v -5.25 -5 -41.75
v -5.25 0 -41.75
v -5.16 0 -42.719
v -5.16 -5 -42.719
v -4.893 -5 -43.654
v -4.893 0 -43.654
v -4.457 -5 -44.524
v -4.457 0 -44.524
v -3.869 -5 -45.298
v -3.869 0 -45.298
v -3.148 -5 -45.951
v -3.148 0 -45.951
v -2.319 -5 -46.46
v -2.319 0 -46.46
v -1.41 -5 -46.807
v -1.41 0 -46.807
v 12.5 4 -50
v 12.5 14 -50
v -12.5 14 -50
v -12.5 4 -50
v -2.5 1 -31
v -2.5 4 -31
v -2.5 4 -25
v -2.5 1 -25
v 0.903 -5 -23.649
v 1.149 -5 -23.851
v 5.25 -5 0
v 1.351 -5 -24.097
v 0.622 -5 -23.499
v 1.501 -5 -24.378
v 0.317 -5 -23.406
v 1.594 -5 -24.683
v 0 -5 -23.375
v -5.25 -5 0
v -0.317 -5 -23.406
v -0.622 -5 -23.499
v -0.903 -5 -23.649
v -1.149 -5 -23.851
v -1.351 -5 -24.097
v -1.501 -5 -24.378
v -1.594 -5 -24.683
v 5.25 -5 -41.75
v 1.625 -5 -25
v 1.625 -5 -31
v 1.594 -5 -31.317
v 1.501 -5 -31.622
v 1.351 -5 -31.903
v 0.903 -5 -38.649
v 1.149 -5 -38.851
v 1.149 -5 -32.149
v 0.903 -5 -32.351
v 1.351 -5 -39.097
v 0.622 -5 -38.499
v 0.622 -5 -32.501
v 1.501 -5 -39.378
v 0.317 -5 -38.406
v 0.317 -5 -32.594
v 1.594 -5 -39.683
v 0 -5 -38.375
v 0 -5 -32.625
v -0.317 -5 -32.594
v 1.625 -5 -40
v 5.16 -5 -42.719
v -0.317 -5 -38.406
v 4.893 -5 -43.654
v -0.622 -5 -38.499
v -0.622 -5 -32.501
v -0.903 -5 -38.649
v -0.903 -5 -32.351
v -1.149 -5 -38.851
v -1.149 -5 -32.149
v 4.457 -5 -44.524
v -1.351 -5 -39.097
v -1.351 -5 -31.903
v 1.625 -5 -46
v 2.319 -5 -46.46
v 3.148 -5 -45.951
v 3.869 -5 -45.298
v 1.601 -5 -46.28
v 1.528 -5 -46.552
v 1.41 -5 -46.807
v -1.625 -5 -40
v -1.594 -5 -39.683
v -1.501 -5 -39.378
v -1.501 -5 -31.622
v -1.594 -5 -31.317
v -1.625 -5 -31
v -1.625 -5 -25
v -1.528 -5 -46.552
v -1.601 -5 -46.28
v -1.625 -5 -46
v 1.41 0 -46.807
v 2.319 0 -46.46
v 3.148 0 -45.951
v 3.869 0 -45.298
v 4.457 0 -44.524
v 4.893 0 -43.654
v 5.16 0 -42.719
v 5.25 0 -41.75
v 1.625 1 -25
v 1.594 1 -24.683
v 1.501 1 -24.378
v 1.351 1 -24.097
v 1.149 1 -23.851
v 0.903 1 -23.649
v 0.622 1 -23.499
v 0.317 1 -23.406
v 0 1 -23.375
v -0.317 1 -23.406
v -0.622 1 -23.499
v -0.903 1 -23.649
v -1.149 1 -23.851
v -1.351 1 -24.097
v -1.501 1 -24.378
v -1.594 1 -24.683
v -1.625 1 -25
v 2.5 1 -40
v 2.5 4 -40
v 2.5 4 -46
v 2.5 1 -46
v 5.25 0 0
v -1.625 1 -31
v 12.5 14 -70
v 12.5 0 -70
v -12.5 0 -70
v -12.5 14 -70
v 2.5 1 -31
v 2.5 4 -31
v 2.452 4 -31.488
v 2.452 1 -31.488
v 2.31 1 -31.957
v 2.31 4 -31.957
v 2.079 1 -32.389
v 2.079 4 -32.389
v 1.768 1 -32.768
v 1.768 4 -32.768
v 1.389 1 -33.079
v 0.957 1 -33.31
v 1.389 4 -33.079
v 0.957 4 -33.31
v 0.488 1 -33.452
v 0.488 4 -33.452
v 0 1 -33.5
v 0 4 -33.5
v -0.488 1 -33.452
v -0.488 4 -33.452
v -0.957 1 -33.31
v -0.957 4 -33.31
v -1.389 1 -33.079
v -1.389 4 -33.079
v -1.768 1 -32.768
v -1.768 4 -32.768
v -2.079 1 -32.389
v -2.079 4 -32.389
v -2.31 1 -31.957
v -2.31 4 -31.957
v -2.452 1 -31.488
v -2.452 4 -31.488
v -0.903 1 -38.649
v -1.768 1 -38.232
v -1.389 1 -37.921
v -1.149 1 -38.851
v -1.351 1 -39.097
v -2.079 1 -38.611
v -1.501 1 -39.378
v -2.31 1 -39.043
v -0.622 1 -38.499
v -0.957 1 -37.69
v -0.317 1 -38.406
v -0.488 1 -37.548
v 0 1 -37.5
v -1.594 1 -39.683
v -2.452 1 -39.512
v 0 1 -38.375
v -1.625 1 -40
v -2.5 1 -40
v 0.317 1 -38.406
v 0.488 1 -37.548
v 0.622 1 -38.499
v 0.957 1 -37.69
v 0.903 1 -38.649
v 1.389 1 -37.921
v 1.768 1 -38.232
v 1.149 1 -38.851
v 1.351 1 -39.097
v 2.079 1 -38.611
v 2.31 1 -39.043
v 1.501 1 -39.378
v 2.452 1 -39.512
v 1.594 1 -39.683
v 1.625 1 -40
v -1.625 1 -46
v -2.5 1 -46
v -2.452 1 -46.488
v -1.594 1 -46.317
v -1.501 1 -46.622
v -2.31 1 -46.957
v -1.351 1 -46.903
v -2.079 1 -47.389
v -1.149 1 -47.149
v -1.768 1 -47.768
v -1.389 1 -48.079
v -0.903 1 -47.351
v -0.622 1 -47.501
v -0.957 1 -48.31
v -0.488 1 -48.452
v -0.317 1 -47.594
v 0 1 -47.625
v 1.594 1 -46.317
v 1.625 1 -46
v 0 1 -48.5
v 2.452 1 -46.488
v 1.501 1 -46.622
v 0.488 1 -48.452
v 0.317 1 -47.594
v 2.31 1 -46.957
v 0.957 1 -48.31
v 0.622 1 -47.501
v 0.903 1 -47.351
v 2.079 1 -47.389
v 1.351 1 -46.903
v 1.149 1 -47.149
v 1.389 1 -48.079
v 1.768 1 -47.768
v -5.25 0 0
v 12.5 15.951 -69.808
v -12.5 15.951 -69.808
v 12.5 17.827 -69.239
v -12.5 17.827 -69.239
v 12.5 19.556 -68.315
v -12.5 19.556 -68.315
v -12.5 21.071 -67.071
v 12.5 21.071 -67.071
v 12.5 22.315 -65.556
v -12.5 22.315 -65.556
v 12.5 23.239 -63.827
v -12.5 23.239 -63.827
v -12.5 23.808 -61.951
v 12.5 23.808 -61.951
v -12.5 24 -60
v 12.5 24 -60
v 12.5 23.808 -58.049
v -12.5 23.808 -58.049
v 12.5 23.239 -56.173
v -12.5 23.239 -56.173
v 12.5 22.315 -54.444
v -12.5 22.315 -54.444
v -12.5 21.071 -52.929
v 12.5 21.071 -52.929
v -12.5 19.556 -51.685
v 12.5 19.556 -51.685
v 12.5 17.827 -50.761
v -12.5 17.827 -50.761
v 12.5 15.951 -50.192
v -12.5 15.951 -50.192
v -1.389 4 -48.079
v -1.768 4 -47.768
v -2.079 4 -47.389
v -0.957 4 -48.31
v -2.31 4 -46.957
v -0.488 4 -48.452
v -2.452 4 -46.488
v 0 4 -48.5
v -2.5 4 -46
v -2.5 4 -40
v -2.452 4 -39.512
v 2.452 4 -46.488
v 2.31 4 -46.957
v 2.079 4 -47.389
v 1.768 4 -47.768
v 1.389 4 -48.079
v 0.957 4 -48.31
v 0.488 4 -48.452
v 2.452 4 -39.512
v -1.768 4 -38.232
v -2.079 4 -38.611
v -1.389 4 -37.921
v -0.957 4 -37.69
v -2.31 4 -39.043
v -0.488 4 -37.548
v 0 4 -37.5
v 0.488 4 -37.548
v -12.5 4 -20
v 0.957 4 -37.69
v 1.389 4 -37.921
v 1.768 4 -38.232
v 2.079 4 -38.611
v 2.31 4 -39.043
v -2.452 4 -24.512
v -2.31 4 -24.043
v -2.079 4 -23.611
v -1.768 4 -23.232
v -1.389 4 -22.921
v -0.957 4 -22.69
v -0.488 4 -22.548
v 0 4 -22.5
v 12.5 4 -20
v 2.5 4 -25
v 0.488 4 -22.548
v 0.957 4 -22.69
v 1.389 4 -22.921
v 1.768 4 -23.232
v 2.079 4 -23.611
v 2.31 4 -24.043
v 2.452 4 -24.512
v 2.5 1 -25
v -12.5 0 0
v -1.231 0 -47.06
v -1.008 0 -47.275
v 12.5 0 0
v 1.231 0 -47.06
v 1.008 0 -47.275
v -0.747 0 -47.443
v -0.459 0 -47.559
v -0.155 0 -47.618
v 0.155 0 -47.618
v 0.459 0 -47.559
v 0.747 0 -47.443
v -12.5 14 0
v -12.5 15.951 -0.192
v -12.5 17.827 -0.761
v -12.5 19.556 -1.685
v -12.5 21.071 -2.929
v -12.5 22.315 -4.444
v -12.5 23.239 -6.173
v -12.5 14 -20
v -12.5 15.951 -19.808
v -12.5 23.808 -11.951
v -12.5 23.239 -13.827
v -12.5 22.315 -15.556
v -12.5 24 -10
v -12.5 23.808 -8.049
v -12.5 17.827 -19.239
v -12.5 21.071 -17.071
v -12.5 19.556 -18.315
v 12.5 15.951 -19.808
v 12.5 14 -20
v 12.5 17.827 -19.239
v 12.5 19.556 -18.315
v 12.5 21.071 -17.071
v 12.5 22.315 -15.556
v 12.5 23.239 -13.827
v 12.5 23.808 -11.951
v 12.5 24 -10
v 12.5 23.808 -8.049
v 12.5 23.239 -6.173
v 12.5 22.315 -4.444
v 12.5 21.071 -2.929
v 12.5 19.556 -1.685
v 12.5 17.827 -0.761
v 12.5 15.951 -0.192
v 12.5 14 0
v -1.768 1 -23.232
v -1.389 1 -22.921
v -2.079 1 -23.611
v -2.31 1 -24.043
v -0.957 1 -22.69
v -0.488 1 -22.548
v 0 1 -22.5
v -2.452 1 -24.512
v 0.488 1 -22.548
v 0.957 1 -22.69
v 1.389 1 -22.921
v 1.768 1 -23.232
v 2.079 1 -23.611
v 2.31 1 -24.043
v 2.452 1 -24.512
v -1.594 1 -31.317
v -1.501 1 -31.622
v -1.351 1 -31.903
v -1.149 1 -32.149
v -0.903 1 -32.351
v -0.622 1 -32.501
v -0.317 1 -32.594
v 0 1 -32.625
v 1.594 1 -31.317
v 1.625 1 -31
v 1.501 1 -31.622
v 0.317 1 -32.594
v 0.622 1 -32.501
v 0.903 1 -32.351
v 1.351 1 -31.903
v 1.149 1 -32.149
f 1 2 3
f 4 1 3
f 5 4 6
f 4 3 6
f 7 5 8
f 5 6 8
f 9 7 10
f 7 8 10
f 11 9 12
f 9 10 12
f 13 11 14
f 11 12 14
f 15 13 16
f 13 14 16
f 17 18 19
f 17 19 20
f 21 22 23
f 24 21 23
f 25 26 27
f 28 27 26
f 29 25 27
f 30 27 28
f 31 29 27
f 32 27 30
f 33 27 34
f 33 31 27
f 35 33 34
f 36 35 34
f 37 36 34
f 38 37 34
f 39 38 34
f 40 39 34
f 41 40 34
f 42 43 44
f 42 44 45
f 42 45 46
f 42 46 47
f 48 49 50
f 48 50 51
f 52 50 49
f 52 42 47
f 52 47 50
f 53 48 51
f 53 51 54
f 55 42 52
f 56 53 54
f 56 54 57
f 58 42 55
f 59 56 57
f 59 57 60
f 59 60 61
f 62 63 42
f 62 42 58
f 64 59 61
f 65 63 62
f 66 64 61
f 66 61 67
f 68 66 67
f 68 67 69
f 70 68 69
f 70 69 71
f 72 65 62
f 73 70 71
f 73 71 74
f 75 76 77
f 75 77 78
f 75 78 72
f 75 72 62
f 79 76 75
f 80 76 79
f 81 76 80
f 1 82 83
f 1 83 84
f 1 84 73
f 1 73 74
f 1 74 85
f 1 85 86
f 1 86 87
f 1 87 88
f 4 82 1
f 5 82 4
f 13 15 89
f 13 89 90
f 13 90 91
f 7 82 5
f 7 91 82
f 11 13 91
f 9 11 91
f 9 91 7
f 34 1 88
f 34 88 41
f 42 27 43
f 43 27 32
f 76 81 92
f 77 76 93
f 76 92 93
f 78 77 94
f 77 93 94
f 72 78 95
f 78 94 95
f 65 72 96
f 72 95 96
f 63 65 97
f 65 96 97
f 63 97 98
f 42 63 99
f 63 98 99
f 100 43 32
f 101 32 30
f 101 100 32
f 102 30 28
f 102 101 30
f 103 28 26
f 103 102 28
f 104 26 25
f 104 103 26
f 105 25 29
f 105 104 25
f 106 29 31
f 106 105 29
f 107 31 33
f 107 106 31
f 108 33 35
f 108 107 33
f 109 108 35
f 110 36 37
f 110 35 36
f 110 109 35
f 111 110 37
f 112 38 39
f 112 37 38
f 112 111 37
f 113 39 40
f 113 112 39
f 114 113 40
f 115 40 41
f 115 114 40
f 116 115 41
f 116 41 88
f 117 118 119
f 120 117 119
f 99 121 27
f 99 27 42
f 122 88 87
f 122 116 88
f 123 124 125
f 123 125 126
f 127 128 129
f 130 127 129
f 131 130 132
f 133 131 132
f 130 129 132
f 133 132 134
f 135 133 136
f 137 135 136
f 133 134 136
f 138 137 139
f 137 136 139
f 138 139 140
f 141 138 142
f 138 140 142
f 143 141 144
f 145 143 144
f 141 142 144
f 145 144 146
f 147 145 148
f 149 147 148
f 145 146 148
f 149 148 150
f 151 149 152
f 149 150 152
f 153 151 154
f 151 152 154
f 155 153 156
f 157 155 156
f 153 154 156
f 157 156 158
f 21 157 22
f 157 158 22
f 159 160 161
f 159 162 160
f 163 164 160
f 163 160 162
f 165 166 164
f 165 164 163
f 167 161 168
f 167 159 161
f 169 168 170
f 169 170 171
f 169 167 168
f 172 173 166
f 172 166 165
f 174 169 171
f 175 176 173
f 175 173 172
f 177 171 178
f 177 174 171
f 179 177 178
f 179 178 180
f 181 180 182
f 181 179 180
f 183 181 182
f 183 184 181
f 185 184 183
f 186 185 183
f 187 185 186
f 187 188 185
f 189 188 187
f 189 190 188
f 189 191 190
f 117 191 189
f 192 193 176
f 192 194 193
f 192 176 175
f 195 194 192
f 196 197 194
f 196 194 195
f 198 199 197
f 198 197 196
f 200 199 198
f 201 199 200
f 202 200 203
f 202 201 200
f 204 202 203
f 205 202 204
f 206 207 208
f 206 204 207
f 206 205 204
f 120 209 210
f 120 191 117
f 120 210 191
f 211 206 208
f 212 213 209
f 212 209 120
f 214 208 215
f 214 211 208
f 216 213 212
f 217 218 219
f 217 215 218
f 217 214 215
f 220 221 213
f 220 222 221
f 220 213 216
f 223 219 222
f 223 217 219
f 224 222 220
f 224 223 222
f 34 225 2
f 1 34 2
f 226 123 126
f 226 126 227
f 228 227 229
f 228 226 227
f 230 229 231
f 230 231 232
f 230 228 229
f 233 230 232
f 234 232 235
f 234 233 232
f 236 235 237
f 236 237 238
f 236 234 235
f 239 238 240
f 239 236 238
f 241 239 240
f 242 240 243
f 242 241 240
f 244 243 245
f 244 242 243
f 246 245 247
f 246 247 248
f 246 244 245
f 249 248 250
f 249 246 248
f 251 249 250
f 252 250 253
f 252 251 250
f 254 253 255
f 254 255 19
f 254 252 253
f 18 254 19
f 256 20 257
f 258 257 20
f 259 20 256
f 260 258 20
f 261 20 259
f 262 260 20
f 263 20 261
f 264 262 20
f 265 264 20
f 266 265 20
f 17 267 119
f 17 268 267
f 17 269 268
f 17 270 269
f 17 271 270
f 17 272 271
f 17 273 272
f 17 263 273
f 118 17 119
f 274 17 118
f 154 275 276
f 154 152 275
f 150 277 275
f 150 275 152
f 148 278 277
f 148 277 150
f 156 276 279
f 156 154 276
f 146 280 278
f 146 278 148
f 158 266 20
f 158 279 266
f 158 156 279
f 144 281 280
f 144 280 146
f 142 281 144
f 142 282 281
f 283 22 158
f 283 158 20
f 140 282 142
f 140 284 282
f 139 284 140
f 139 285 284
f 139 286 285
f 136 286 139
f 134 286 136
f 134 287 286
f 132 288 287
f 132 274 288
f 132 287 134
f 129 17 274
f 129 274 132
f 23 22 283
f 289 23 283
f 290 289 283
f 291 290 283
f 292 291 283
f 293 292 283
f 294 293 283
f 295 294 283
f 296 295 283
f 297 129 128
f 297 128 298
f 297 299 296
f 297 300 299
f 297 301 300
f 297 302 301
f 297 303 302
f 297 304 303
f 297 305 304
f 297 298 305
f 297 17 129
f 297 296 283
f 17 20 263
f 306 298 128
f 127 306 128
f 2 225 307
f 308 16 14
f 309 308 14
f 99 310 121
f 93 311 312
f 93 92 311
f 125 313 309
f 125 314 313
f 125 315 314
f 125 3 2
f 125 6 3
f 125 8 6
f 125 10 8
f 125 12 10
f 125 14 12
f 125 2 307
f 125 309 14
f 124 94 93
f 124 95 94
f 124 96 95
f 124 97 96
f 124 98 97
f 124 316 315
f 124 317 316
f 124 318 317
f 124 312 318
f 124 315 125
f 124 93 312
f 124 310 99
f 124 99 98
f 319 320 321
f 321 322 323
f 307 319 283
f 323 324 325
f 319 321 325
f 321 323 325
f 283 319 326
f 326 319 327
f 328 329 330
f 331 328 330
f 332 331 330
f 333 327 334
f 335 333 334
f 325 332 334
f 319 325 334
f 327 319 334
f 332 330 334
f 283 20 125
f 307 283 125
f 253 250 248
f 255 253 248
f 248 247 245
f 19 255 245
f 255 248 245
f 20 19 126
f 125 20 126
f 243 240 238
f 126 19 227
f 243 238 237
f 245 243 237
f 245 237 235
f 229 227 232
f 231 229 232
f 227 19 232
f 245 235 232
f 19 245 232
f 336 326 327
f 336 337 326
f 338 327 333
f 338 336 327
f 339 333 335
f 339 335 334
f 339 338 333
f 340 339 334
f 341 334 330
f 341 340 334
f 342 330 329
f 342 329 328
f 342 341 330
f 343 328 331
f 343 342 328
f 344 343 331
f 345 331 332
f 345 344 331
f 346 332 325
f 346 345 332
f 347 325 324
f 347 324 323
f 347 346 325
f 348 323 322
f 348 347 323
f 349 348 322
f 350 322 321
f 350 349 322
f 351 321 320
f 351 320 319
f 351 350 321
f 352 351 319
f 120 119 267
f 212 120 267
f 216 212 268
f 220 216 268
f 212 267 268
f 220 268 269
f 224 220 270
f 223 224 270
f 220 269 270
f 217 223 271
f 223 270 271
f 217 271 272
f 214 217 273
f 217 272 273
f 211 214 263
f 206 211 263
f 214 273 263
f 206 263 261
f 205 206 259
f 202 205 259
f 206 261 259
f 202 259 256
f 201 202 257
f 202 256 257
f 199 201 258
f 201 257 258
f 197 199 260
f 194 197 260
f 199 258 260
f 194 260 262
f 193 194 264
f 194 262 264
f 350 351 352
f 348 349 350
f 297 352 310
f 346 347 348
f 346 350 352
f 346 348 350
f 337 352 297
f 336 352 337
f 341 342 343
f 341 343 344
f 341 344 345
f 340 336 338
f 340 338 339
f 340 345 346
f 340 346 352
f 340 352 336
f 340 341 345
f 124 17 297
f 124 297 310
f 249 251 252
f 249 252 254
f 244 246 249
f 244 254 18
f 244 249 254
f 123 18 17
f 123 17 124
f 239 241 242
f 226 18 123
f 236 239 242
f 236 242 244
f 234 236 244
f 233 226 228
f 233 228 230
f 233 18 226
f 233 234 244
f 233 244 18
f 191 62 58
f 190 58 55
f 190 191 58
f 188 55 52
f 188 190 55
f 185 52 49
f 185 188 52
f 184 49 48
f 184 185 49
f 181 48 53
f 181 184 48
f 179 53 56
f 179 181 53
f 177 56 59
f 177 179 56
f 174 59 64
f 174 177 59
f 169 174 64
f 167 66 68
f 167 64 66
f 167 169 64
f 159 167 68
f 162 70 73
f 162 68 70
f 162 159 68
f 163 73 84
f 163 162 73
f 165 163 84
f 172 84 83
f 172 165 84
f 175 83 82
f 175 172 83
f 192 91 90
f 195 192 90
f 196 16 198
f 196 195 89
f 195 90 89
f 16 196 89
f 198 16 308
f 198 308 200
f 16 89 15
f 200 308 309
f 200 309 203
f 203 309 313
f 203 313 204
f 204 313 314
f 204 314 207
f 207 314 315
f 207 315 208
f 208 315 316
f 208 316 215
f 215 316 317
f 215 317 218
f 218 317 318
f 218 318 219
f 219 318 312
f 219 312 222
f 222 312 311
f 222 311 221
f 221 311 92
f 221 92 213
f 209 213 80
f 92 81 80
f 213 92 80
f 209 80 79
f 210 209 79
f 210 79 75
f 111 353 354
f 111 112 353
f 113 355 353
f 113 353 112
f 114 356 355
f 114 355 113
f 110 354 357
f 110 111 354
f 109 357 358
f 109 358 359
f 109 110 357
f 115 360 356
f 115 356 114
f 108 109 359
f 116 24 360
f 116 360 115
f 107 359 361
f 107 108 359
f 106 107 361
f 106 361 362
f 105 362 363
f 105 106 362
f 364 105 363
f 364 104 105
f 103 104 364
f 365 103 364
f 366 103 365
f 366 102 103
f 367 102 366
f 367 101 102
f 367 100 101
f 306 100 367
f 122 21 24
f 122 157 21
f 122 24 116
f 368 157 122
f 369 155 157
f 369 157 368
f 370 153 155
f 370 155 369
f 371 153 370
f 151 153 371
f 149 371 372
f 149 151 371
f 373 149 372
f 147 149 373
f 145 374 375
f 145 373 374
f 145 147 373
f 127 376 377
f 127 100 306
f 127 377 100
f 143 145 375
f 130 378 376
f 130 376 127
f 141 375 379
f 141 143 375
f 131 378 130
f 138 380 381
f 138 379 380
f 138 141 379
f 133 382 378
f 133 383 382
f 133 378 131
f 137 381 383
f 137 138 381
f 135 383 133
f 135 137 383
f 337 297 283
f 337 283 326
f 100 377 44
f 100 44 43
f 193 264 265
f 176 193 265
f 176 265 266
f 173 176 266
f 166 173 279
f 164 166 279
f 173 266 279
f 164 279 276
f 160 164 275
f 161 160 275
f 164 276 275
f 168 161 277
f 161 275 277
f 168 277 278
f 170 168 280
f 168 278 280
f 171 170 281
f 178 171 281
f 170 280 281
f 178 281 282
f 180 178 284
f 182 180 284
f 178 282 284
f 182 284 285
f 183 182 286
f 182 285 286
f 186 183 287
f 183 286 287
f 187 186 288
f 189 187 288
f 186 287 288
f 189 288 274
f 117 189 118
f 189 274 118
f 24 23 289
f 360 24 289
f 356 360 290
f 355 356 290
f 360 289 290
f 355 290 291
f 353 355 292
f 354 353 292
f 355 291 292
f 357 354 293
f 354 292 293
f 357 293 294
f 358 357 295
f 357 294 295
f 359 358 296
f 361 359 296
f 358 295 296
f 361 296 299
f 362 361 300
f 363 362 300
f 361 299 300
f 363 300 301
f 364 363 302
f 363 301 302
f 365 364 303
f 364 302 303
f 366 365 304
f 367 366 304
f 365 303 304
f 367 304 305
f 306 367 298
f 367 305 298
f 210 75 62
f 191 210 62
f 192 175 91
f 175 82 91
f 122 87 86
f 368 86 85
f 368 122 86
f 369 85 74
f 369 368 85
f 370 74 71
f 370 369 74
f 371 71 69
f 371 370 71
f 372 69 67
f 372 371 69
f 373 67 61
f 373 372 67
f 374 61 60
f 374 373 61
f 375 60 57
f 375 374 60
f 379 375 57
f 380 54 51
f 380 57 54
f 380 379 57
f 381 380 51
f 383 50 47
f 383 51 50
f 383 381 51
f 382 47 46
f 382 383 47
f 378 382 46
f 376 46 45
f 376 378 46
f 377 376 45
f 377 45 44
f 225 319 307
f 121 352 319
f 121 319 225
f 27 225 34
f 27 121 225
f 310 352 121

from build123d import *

# Parameters (mm, degrees)
BOSS_EXTRUDE1_DEPTH     = 12.5
SKETCH2_W               = 10.5
SKETCH2_H               = 41.75
BOSS_EXTRUDE2_DEPTH     = 5
CUT_EXTRUDE1_DEPTH      = 25
CUT_EXTRUDE1_DEPTH_BACK = 6
CUT_EXTRUDE2_START      = 4
CUT_EXTRUDE2_DEPTH      = 3


with BuildPart() as part:
    # Sketch1 → Boss-Extrude1 (new body, symmetric)
    with BuildSketch(Plane(origin=(0, 0, 0), x_dir=(0, 0, -1), z_dir=(1, 0, 0))):
        with BuildLine():
            Line((0, 0), (70, 0))
            Line((70, 0), (70, 14))
            ThreePointArc((70, 14), (60, 24), (50, 14))
            Line((50, 14), (50, 4))
            Line((50, 4), (20, 4))
            Line((20, 4), (20, 14))
            ThreePointArc((20, 14), (10, 24), (0, 14))
            Line((0, 14), (0, 0))
        make_face()
    extrude(amount=BOSS_EXTRUDE1_DEPTH, both=True)

    # Sketch2 → Boss-Extrude2 (add)
    with BuildSketch(Plane(origin=(0, 0, 0), x_dir=(1, 0, 0), z_dir=(0, 1, 0))):
        with BuildLine():
            ThreePointArc((-5.25, 41.75), (0, 47), (5.25, 41.75))
            Line((5.25, 41.75), (-5.25, 41.75))
        make_face()
        with Locations((0, 20.875)):
            Rectangle(SKETCH2_W, SKETCH2_H)
    extrude(amount=-BOSS_EXTRUDE2_DEPTH)

    # Sketch4 → Cut-Extrude1 (cut, two sides)
    with BuildSketch(Plane(origin=(0, 0, 0), x_dir=(1, 0, 0), z_dir=(0, 1, 0))) as cut_extrude1_sk:
        with BuildLine():
            Line((1.625, 31), (1.625, 25))
            ThreePointArc((1.625, 25), (0, 23.375), (-1.625, 25))
            Line((-1.625, 25), (-1.625, 31))
            ThreePointArc((-1.625, 31), (0, 32.625), (1.625, 31))
        make_face()
        with BuildLine():
            Line((1.625, 46), (1.625, 40))
            ThreePointArc((1.625, 40), (0, 38.375), (-1.625, 40))
            Line((-1.625, 40), (-1.625, 46))
            ThreePointArc((-1.625, 46), (0, 47.625), (1.625, 46))
        make_face()
    extrude(amount=CUT_EXTRUDE1_DEPTH, mode=Mode.SUBTRACT)
    extrude(cut_extrude1_sk.sketch, amount=-CUT_EXTRUDE1_DEPTH_BACK, mode=Mode.SUBTRACT)

    # Sketch4<3> → Cut-Extrude2 (cut)
    with BuildSketch(Plane(origin=(0, 0, 0), x_dir=(1, 0, 0), z_dir=(0, 1, 0)).offset(CUT_EXTRUDE2_START)):
        with BuildLine():
            Line((-2.5, 31), (-2.5, 25))
            ThreePointArc((-2.5, 25), (0, 22.5), (2.5, 25))
            Line((2.5, 25), (2.5, 31))
            ThreePointArc((2.5, 31), (0, 33.5), (-2.5, 31))
        make_face()
        with BuildLine():
            ThreePointArc((1.625, 31), (0, 32.625), (-1.625, 31))
            Line((-1.625, 31), (-1.625, 25))
            ThreePointArc((-1.625, 25), (0, 23.375), (1.625, 25))
            Line((1.625, 25), (1.625, 31))
        make_face(mode=Mode.SUBTRACT)
        with BuildLine():
            Line((-2.5, 46), (-2.5, 40))
            ThreePointArc((-2.5, 40), (0, 37.5), (2.5, 40))
            Line((2.5, 40), (2.5, 46))
            ThreePointArc((2.5, 46), (0, 48.5), (-2.5, 46))
        make_face()
        with BuildLine():
            ThreePointArc((1.625, 46), (0, 47.625), (-1.625, 46))
            Line((-1.625, 46), (-1.625, 40))
            ThreePointArc((-1.625, 40), (0, 38.375), (1.625, 40))
            Line((1.625, 40), (1.625, 46))
        make_face(mode=Mode.SUBTRACT)
    extrude(amount=-CUT_EXTRUDE2_DEPTH, mode=Mode.SUBTRACT)


solid = part.part
